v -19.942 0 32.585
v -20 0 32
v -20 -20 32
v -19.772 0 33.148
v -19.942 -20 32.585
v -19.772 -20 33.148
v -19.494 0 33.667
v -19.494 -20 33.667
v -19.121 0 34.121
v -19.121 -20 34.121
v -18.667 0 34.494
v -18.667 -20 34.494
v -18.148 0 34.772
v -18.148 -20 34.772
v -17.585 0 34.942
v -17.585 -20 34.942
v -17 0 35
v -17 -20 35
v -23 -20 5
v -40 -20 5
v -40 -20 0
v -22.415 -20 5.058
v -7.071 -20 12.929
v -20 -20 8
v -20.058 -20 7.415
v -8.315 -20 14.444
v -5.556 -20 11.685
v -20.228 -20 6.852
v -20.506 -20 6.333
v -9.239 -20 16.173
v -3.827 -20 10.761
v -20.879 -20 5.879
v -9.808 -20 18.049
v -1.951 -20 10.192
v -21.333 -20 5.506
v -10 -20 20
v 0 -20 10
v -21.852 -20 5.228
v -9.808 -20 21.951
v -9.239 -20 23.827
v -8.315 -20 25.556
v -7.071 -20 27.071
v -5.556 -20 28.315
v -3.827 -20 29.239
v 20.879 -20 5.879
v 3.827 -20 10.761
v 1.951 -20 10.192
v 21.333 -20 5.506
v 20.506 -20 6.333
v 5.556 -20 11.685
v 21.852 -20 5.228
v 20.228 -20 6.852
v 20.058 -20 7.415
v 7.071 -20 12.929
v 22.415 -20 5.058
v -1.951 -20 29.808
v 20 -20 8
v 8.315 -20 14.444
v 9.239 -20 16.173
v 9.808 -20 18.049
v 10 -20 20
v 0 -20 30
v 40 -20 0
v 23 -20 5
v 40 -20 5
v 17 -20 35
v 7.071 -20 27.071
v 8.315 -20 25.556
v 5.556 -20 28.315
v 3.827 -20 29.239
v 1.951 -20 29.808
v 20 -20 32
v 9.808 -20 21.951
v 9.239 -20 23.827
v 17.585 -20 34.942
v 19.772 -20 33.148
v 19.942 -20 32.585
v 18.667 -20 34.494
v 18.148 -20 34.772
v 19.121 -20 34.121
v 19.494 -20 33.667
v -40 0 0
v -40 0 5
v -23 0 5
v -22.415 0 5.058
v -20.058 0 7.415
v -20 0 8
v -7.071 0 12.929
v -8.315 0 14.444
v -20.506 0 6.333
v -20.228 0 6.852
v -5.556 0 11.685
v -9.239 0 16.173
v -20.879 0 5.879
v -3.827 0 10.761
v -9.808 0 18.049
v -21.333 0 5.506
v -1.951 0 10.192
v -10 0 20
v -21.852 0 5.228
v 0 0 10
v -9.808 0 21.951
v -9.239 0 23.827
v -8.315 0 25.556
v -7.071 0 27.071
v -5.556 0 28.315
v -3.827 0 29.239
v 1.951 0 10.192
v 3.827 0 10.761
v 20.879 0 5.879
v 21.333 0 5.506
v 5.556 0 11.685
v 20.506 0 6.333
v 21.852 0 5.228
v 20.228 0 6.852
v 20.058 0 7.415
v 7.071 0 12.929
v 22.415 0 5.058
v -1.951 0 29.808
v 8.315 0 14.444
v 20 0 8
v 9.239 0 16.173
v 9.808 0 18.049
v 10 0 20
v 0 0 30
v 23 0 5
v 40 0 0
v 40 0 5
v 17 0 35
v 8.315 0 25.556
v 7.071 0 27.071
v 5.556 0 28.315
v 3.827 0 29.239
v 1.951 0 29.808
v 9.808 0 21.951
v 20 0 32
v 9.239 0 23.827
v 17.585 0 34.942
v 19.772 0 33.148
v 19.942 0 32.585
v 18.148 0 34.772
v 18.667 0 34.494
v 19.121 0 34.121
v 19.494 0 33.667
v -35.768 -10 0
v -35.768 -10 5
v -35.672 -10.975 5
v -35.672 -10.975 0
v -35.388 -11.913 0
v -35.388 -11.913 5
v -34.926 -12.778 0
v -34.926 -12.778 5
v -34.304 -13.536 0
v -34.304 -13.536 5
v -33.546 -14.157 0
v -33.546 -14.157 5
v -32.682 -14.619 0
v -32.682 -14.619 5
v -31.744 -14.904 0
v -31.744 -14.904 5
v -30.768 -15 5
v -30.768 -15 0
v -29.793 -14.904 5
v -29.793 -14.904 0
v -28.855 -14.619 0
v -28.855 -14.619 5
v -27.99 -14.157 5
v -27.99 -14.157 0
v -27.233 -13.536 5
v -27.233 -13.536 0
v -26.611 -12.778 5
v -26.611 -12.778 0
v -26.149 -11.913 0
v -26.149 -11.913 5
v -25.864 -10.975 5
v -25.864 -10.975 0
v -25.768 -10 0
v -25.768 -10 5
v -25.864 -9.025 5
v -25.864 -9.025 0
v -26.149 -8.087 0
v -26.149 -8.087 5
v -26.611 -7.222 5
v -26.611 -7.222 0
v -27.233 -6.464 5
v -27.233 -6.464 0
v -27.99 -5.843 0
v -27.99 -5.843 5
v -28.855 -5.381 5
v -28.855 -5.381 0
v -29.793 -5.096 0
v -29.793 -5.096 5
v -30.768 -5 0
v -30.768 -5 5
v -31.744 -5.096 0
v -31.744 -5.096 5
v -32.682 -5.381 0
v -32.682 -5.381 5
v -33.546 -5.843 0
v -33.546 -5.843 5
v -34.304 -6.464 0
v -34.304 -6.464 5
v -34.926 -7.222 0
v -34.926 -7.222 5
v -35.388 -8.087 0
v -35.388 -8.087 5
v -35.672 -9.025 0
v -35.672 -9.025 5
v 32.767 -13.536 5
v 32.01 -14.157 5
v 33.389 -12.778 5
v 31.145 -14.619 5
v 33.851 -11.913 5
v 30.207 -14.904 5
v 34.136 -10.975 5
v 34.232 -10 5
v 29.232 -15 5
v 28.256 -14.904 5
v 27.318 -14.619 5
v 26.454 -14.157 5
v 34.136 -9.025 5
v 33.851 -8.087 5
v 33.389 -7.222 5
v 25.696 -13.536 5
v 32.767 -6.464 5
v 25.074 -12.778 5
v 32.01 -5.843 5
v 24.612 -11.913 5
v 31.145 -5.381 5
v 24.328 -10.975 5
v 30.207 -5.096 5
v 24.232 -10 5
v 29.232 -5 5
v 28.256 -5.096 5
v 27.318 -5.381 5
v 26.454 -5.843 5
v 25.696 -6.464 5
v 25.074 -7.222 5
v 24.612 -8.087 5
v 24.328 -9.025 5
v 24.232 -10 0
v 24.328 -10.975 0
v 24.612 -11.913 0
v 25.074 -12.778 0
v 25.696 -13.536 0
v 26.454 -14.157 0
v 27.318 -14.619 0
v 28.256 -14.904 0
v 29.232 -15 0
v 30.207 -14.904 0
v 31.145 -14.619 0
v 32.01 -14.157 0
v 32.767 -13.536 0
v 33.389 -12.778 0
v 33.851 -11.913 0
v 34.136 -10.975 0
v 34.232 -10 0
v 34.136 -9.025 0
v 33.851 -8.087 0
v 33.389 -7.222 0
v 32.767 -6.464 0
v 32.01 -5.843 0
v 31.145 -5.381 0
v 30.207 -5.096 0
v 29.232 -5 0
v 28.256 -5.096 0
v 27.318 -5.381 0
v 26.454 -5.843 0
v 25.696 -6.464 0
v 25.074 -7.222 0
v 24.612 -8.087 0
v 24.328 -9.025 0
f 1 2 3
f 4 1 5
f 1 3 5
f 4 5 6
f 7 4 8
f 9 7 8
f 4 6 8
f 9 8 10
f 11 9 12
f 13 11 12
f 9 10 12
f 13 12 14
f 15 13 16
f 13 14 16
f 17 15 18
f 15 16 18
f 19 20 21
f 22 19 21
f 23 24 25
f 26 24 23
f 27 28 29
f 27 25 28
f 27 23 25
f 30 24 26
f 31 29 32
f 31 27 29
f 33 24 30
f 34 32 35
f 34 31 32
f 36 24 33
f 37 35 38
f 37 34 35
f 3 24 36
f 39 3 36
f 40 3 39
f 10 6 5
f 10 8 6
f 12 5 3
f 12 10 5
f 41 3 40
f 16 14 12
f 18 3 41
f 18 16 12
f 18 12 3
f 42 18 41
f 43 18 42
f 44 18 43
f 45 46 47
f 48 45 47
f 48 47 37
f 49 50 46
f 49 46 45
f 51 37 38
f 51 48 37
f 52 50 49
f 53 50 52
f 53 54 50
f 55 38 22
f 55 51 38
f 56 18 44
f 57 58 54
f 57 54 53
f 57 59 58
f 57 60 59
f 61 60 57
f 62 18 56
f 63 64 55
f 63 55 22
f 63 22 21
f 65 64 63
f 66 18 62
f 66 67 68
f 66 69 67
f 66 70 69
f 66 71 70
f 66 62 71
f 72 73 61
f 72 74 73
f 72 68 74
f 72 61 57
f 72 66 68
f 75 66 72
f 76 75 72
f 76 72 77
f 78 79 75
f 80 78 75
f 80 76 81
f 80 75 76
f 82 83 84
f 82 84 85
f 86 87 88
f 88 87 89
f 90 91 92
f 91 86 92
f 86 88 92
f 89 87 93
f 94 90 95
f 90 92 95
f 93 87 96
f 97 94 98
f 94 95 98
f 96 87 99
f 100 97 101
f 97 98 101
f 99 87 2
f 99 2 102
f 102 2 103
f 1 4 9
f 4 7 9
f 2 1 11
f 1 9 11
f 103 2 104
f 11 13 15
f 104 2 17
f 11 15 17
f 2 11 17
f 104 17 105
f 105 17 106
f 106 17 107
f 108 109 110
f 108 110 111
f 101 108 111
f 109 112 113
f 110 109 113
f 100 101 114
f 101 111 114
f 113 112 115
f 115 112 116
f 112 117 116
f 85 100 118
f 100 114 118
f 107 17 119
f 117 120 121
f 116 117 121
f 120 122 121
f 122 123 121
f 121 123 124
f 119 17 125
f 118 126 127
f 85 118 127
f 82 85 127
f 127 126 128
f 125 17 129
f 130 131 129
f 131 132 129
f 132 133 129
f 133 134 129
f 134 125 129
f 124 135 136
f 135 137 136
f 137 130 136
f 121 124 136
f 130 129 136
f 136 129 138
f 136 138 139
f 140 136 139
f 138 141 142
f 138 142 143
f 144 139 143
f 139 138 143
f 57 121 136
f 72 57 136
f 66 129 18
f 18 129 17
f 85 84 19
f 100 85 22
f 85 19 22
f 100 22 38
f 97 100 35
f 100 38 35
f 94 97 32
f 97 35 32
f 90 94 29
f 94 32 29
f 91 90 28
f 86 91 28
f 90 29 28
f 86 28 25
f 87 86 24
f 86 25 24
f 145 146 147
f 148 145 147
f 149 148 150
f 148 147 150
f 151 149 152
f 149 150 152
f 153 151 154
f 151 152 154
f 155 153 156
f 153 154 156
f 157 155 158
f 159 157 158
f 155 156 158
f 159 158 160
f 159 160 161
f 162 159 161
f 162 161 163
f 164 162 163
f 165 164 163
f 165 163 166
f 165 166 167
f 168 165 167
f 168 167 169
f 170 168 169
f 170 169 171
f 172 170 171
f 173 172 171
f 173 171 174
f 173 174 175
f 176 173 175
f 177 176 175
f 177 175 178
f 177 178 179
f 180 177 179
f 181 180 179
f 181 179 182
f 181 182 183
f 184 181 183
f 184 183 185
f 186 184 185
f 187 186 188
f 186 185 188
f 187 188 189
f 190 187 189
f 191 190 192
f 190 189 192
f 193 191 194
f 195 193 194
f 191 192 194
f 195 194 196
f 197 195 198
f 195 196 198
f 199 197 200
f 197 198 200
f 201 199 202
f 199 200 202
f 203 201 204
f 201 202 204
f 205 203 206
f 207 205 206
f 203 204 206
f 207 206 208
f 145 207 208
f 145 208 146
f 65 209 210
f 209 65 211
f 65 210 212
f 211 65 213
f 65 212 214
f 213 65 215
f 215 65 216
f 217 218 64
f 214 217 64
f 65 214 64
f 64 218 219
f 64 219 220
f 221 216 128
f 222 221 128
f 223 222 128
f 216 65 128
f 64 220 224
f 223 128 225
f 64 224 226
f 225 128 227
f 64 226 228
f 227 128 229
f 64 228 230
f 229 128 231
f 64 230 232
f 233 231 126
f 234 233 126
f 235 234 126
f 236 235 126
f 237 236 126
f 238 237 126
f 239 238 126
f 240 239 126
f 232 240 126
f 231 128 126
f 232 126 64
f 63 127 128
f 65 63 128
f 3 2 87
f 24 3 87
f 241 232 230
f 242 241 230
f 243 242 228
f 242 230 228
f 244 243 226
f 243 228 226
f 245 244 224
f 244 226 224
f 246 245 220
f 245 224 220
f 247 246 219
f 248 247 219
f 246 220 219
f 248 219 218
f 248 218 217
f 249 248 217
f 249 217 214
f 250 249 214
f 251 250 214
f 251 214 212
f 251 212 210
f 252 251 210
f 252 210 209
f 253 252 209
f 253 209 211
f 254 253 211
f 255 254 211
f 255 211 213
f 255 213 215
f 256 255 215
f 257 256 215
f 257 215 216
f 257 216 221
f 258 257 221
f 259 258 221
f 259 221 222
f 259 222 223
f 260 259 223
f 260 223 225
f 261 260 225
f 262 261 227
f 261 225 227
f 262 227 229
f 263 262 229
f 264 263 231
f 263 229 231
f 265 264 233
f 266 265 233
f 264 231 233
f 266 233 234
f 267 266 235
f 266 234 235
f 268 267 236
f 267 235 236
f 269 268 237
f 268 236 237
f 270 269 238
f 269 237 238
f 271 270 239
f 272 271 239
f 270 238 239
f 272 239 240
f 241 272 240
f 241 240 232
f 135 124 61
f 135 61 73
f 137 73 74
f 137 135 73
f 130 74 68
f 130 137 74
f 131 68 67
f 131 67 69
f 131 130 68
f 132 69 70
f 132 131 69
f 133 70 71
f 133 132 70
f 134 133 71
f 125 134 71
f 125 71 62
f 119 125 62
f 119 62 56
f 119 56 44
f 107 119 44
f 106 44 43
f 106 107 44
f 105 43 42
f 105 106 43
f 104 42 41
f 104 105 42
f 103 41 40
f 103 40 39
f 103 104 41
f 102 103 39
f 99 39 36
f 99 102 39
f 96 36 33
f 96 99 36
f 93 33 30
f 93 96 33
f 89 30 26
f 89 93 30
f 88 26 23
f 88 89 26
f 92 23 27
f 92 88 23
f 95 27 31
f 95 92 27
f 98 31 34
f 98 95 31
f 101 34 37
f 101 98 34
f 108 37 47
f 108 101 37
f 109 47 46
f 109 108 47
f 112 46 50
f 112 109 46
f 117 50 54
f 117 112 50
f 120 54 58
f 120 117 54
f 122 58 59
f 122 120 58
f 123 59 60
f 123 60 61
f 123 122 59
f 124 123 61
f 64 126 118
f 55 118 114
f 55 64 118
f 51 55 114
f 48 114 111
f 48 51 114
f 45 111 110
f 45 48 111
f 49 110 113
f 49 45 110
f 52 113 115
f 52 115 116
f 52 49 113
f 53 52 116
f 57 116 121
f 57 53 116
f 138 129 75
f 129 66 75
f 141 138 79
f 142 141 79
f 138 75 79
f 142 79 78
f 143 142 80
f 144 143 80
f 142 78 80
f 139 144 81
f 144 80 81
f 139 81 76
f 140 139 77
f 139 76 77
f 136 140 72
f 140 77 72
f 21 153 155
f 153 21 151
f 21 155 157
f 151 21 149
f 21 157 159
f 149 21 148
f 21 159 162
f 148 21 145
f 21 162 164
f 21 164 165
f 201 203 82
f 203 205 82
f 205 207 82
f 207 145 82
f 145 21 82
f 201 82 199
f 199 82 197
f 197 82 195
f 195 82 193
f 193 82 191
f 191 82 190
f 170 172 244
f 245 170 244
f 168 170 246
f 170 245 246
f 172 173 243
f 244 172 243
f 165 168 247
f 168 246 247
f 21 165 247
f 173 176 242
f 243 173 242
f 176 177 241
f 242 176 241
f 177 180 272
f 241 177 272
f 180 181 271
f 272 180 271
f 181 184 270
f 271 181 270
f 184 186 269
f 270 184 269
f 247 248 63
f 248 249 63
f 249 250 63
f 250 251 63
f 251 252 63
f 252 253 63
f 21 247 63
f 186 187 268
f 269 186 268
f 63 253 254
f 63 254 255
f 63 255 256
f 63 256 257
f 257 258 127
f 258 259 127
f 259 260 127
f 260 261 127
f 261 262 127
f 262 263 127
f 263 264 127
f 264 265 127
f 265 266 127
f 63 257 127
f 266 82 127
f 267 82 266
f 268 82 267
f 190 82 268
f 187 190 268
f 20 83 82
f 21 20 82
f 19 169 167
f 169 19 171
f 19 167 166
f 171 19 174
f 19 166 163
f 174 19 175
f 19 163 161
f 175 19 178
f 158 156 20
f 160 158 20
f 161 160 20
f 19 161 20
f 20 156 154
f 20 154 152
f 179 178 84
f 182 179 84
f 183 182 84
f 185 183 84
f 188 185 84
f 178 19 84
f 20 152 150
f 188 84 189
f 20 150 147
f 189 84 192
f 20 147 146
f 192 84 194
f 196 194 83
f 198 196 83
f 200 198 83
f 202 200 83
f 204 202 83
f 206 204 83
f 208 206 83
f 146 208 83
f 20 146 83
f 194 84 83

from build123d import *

# Parameters (mm, degrees)
F0_R     = 10
F1_DEPTH = 20
F2_R     = 3
F4_D     = 10


with BuildPart() as f1:
    # F0 (on Front) → F1 (new body)
    with BuildSketch(Plane.XZ):
        Polygon((-40, 5), (-40, 0), (40, 0), (40, 5), (20, 5), (20, 35), (-20, 35), (-20, 5), align=None)
        with Locations((0, 20)):
            Circle(F0_R, mode=Mode.SUBTRACT)
    extrude(amount=F1_DEPTH)

    # F2
    f2_edges = [f1.edges().sort_by_distance(p)[0] for p in [
        (20, -10, 35),
        (20, -10, 5),
        (-20, -10, 35),
        (-20, -10, 5),
    ]]
    fillet(f2_edges, radius=F2_R)

    # F4 (through all)
    with Locations(Plane(origin=(0, 0, 0), x_dir=(1, 0, 0), z_dir=(0, 0, -1))):
        with Locations((-30.768288, 10), (29.231712, 10)):
            Hole(F4_D / 2)


solid = f1.part
